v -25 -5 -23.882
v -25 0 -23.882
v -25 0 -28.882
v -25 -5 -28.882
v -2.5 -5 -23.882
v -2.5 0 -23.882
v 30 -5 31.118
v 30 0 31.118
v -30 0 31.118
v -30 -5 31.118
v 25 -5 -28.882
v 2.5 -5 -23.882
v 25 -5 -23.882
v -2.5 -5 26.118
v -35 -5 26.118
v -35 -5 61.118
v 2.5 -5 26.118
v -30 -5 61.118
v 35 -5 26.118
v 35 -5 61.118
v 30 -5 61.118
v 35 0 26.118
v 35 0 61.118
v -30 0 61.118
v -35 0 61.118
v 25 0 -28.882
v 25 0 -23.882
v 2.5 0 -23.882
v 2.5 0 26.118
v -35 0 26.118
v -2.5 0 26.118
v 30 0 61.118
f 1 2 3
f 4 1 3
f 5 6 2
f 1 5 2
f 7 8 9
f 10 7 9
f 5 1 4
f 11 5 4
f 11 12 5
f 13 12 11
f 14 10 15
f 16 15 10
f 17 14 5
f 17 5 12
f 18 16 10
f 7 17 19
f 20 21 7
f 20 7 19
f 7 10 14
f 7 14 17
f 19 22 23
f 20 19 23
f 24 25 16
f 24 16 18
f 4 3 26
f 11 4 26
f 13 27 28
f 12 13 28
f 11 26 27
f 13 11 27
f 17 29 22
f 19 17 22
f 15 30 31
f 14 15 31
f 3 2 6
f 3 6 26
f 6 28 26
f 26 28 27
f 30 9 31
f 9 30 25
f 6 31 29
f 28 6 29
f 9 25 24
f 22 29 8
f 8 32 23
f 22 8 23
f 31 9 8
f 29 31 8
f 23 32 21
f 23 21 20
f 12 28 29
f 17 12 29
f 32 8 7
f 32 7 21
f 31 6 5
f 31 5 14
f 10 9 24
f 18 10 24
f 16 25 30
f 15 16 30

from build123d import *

# Parameters (mm, degrees)
F0_W     = 5
F0_H     = 50
F0_H_2   = 30
F1_DEPTH = 5


# Not quite as in the source:
# - a feature of the source that left no trace in its solid (it failed there, or was rolled back) is left out


with BuildPart() as f1:
    # F0 (on Front) → F1 (new body)
    with BuildSketch(Plane.XZ):
        Polygon((-35, 26.1184218031), (-2.5, 26.1184218031), (2.5, 26.1184218031), (35, 26.1184218031), (35, 31.1184218031), (30, 31.1184218031), (-30, 31.1184218031), (-35, 31.1184218031), align=None)
        with Locations((0, 1.1184218031)):
            Rectangle(F0_W, F0_H)
        Polygon((2.5, -23.8815781969), (-2.5, -23.8815781969), (-25, -23.8815781969), (-25, -28.8815781969), (25, -28.8815781969), (25, -23.8815781969), align=None)
        with Locations((-32.5, 46.1184218031)):
            Rectangle(F0_W, F0_H_2)
        with Locations((32.5, 46.1184218031)):
            Rectangle(F0_W, F0_H_2)
    extrude(amount=F1_DEPTH)


solid = f1.part
